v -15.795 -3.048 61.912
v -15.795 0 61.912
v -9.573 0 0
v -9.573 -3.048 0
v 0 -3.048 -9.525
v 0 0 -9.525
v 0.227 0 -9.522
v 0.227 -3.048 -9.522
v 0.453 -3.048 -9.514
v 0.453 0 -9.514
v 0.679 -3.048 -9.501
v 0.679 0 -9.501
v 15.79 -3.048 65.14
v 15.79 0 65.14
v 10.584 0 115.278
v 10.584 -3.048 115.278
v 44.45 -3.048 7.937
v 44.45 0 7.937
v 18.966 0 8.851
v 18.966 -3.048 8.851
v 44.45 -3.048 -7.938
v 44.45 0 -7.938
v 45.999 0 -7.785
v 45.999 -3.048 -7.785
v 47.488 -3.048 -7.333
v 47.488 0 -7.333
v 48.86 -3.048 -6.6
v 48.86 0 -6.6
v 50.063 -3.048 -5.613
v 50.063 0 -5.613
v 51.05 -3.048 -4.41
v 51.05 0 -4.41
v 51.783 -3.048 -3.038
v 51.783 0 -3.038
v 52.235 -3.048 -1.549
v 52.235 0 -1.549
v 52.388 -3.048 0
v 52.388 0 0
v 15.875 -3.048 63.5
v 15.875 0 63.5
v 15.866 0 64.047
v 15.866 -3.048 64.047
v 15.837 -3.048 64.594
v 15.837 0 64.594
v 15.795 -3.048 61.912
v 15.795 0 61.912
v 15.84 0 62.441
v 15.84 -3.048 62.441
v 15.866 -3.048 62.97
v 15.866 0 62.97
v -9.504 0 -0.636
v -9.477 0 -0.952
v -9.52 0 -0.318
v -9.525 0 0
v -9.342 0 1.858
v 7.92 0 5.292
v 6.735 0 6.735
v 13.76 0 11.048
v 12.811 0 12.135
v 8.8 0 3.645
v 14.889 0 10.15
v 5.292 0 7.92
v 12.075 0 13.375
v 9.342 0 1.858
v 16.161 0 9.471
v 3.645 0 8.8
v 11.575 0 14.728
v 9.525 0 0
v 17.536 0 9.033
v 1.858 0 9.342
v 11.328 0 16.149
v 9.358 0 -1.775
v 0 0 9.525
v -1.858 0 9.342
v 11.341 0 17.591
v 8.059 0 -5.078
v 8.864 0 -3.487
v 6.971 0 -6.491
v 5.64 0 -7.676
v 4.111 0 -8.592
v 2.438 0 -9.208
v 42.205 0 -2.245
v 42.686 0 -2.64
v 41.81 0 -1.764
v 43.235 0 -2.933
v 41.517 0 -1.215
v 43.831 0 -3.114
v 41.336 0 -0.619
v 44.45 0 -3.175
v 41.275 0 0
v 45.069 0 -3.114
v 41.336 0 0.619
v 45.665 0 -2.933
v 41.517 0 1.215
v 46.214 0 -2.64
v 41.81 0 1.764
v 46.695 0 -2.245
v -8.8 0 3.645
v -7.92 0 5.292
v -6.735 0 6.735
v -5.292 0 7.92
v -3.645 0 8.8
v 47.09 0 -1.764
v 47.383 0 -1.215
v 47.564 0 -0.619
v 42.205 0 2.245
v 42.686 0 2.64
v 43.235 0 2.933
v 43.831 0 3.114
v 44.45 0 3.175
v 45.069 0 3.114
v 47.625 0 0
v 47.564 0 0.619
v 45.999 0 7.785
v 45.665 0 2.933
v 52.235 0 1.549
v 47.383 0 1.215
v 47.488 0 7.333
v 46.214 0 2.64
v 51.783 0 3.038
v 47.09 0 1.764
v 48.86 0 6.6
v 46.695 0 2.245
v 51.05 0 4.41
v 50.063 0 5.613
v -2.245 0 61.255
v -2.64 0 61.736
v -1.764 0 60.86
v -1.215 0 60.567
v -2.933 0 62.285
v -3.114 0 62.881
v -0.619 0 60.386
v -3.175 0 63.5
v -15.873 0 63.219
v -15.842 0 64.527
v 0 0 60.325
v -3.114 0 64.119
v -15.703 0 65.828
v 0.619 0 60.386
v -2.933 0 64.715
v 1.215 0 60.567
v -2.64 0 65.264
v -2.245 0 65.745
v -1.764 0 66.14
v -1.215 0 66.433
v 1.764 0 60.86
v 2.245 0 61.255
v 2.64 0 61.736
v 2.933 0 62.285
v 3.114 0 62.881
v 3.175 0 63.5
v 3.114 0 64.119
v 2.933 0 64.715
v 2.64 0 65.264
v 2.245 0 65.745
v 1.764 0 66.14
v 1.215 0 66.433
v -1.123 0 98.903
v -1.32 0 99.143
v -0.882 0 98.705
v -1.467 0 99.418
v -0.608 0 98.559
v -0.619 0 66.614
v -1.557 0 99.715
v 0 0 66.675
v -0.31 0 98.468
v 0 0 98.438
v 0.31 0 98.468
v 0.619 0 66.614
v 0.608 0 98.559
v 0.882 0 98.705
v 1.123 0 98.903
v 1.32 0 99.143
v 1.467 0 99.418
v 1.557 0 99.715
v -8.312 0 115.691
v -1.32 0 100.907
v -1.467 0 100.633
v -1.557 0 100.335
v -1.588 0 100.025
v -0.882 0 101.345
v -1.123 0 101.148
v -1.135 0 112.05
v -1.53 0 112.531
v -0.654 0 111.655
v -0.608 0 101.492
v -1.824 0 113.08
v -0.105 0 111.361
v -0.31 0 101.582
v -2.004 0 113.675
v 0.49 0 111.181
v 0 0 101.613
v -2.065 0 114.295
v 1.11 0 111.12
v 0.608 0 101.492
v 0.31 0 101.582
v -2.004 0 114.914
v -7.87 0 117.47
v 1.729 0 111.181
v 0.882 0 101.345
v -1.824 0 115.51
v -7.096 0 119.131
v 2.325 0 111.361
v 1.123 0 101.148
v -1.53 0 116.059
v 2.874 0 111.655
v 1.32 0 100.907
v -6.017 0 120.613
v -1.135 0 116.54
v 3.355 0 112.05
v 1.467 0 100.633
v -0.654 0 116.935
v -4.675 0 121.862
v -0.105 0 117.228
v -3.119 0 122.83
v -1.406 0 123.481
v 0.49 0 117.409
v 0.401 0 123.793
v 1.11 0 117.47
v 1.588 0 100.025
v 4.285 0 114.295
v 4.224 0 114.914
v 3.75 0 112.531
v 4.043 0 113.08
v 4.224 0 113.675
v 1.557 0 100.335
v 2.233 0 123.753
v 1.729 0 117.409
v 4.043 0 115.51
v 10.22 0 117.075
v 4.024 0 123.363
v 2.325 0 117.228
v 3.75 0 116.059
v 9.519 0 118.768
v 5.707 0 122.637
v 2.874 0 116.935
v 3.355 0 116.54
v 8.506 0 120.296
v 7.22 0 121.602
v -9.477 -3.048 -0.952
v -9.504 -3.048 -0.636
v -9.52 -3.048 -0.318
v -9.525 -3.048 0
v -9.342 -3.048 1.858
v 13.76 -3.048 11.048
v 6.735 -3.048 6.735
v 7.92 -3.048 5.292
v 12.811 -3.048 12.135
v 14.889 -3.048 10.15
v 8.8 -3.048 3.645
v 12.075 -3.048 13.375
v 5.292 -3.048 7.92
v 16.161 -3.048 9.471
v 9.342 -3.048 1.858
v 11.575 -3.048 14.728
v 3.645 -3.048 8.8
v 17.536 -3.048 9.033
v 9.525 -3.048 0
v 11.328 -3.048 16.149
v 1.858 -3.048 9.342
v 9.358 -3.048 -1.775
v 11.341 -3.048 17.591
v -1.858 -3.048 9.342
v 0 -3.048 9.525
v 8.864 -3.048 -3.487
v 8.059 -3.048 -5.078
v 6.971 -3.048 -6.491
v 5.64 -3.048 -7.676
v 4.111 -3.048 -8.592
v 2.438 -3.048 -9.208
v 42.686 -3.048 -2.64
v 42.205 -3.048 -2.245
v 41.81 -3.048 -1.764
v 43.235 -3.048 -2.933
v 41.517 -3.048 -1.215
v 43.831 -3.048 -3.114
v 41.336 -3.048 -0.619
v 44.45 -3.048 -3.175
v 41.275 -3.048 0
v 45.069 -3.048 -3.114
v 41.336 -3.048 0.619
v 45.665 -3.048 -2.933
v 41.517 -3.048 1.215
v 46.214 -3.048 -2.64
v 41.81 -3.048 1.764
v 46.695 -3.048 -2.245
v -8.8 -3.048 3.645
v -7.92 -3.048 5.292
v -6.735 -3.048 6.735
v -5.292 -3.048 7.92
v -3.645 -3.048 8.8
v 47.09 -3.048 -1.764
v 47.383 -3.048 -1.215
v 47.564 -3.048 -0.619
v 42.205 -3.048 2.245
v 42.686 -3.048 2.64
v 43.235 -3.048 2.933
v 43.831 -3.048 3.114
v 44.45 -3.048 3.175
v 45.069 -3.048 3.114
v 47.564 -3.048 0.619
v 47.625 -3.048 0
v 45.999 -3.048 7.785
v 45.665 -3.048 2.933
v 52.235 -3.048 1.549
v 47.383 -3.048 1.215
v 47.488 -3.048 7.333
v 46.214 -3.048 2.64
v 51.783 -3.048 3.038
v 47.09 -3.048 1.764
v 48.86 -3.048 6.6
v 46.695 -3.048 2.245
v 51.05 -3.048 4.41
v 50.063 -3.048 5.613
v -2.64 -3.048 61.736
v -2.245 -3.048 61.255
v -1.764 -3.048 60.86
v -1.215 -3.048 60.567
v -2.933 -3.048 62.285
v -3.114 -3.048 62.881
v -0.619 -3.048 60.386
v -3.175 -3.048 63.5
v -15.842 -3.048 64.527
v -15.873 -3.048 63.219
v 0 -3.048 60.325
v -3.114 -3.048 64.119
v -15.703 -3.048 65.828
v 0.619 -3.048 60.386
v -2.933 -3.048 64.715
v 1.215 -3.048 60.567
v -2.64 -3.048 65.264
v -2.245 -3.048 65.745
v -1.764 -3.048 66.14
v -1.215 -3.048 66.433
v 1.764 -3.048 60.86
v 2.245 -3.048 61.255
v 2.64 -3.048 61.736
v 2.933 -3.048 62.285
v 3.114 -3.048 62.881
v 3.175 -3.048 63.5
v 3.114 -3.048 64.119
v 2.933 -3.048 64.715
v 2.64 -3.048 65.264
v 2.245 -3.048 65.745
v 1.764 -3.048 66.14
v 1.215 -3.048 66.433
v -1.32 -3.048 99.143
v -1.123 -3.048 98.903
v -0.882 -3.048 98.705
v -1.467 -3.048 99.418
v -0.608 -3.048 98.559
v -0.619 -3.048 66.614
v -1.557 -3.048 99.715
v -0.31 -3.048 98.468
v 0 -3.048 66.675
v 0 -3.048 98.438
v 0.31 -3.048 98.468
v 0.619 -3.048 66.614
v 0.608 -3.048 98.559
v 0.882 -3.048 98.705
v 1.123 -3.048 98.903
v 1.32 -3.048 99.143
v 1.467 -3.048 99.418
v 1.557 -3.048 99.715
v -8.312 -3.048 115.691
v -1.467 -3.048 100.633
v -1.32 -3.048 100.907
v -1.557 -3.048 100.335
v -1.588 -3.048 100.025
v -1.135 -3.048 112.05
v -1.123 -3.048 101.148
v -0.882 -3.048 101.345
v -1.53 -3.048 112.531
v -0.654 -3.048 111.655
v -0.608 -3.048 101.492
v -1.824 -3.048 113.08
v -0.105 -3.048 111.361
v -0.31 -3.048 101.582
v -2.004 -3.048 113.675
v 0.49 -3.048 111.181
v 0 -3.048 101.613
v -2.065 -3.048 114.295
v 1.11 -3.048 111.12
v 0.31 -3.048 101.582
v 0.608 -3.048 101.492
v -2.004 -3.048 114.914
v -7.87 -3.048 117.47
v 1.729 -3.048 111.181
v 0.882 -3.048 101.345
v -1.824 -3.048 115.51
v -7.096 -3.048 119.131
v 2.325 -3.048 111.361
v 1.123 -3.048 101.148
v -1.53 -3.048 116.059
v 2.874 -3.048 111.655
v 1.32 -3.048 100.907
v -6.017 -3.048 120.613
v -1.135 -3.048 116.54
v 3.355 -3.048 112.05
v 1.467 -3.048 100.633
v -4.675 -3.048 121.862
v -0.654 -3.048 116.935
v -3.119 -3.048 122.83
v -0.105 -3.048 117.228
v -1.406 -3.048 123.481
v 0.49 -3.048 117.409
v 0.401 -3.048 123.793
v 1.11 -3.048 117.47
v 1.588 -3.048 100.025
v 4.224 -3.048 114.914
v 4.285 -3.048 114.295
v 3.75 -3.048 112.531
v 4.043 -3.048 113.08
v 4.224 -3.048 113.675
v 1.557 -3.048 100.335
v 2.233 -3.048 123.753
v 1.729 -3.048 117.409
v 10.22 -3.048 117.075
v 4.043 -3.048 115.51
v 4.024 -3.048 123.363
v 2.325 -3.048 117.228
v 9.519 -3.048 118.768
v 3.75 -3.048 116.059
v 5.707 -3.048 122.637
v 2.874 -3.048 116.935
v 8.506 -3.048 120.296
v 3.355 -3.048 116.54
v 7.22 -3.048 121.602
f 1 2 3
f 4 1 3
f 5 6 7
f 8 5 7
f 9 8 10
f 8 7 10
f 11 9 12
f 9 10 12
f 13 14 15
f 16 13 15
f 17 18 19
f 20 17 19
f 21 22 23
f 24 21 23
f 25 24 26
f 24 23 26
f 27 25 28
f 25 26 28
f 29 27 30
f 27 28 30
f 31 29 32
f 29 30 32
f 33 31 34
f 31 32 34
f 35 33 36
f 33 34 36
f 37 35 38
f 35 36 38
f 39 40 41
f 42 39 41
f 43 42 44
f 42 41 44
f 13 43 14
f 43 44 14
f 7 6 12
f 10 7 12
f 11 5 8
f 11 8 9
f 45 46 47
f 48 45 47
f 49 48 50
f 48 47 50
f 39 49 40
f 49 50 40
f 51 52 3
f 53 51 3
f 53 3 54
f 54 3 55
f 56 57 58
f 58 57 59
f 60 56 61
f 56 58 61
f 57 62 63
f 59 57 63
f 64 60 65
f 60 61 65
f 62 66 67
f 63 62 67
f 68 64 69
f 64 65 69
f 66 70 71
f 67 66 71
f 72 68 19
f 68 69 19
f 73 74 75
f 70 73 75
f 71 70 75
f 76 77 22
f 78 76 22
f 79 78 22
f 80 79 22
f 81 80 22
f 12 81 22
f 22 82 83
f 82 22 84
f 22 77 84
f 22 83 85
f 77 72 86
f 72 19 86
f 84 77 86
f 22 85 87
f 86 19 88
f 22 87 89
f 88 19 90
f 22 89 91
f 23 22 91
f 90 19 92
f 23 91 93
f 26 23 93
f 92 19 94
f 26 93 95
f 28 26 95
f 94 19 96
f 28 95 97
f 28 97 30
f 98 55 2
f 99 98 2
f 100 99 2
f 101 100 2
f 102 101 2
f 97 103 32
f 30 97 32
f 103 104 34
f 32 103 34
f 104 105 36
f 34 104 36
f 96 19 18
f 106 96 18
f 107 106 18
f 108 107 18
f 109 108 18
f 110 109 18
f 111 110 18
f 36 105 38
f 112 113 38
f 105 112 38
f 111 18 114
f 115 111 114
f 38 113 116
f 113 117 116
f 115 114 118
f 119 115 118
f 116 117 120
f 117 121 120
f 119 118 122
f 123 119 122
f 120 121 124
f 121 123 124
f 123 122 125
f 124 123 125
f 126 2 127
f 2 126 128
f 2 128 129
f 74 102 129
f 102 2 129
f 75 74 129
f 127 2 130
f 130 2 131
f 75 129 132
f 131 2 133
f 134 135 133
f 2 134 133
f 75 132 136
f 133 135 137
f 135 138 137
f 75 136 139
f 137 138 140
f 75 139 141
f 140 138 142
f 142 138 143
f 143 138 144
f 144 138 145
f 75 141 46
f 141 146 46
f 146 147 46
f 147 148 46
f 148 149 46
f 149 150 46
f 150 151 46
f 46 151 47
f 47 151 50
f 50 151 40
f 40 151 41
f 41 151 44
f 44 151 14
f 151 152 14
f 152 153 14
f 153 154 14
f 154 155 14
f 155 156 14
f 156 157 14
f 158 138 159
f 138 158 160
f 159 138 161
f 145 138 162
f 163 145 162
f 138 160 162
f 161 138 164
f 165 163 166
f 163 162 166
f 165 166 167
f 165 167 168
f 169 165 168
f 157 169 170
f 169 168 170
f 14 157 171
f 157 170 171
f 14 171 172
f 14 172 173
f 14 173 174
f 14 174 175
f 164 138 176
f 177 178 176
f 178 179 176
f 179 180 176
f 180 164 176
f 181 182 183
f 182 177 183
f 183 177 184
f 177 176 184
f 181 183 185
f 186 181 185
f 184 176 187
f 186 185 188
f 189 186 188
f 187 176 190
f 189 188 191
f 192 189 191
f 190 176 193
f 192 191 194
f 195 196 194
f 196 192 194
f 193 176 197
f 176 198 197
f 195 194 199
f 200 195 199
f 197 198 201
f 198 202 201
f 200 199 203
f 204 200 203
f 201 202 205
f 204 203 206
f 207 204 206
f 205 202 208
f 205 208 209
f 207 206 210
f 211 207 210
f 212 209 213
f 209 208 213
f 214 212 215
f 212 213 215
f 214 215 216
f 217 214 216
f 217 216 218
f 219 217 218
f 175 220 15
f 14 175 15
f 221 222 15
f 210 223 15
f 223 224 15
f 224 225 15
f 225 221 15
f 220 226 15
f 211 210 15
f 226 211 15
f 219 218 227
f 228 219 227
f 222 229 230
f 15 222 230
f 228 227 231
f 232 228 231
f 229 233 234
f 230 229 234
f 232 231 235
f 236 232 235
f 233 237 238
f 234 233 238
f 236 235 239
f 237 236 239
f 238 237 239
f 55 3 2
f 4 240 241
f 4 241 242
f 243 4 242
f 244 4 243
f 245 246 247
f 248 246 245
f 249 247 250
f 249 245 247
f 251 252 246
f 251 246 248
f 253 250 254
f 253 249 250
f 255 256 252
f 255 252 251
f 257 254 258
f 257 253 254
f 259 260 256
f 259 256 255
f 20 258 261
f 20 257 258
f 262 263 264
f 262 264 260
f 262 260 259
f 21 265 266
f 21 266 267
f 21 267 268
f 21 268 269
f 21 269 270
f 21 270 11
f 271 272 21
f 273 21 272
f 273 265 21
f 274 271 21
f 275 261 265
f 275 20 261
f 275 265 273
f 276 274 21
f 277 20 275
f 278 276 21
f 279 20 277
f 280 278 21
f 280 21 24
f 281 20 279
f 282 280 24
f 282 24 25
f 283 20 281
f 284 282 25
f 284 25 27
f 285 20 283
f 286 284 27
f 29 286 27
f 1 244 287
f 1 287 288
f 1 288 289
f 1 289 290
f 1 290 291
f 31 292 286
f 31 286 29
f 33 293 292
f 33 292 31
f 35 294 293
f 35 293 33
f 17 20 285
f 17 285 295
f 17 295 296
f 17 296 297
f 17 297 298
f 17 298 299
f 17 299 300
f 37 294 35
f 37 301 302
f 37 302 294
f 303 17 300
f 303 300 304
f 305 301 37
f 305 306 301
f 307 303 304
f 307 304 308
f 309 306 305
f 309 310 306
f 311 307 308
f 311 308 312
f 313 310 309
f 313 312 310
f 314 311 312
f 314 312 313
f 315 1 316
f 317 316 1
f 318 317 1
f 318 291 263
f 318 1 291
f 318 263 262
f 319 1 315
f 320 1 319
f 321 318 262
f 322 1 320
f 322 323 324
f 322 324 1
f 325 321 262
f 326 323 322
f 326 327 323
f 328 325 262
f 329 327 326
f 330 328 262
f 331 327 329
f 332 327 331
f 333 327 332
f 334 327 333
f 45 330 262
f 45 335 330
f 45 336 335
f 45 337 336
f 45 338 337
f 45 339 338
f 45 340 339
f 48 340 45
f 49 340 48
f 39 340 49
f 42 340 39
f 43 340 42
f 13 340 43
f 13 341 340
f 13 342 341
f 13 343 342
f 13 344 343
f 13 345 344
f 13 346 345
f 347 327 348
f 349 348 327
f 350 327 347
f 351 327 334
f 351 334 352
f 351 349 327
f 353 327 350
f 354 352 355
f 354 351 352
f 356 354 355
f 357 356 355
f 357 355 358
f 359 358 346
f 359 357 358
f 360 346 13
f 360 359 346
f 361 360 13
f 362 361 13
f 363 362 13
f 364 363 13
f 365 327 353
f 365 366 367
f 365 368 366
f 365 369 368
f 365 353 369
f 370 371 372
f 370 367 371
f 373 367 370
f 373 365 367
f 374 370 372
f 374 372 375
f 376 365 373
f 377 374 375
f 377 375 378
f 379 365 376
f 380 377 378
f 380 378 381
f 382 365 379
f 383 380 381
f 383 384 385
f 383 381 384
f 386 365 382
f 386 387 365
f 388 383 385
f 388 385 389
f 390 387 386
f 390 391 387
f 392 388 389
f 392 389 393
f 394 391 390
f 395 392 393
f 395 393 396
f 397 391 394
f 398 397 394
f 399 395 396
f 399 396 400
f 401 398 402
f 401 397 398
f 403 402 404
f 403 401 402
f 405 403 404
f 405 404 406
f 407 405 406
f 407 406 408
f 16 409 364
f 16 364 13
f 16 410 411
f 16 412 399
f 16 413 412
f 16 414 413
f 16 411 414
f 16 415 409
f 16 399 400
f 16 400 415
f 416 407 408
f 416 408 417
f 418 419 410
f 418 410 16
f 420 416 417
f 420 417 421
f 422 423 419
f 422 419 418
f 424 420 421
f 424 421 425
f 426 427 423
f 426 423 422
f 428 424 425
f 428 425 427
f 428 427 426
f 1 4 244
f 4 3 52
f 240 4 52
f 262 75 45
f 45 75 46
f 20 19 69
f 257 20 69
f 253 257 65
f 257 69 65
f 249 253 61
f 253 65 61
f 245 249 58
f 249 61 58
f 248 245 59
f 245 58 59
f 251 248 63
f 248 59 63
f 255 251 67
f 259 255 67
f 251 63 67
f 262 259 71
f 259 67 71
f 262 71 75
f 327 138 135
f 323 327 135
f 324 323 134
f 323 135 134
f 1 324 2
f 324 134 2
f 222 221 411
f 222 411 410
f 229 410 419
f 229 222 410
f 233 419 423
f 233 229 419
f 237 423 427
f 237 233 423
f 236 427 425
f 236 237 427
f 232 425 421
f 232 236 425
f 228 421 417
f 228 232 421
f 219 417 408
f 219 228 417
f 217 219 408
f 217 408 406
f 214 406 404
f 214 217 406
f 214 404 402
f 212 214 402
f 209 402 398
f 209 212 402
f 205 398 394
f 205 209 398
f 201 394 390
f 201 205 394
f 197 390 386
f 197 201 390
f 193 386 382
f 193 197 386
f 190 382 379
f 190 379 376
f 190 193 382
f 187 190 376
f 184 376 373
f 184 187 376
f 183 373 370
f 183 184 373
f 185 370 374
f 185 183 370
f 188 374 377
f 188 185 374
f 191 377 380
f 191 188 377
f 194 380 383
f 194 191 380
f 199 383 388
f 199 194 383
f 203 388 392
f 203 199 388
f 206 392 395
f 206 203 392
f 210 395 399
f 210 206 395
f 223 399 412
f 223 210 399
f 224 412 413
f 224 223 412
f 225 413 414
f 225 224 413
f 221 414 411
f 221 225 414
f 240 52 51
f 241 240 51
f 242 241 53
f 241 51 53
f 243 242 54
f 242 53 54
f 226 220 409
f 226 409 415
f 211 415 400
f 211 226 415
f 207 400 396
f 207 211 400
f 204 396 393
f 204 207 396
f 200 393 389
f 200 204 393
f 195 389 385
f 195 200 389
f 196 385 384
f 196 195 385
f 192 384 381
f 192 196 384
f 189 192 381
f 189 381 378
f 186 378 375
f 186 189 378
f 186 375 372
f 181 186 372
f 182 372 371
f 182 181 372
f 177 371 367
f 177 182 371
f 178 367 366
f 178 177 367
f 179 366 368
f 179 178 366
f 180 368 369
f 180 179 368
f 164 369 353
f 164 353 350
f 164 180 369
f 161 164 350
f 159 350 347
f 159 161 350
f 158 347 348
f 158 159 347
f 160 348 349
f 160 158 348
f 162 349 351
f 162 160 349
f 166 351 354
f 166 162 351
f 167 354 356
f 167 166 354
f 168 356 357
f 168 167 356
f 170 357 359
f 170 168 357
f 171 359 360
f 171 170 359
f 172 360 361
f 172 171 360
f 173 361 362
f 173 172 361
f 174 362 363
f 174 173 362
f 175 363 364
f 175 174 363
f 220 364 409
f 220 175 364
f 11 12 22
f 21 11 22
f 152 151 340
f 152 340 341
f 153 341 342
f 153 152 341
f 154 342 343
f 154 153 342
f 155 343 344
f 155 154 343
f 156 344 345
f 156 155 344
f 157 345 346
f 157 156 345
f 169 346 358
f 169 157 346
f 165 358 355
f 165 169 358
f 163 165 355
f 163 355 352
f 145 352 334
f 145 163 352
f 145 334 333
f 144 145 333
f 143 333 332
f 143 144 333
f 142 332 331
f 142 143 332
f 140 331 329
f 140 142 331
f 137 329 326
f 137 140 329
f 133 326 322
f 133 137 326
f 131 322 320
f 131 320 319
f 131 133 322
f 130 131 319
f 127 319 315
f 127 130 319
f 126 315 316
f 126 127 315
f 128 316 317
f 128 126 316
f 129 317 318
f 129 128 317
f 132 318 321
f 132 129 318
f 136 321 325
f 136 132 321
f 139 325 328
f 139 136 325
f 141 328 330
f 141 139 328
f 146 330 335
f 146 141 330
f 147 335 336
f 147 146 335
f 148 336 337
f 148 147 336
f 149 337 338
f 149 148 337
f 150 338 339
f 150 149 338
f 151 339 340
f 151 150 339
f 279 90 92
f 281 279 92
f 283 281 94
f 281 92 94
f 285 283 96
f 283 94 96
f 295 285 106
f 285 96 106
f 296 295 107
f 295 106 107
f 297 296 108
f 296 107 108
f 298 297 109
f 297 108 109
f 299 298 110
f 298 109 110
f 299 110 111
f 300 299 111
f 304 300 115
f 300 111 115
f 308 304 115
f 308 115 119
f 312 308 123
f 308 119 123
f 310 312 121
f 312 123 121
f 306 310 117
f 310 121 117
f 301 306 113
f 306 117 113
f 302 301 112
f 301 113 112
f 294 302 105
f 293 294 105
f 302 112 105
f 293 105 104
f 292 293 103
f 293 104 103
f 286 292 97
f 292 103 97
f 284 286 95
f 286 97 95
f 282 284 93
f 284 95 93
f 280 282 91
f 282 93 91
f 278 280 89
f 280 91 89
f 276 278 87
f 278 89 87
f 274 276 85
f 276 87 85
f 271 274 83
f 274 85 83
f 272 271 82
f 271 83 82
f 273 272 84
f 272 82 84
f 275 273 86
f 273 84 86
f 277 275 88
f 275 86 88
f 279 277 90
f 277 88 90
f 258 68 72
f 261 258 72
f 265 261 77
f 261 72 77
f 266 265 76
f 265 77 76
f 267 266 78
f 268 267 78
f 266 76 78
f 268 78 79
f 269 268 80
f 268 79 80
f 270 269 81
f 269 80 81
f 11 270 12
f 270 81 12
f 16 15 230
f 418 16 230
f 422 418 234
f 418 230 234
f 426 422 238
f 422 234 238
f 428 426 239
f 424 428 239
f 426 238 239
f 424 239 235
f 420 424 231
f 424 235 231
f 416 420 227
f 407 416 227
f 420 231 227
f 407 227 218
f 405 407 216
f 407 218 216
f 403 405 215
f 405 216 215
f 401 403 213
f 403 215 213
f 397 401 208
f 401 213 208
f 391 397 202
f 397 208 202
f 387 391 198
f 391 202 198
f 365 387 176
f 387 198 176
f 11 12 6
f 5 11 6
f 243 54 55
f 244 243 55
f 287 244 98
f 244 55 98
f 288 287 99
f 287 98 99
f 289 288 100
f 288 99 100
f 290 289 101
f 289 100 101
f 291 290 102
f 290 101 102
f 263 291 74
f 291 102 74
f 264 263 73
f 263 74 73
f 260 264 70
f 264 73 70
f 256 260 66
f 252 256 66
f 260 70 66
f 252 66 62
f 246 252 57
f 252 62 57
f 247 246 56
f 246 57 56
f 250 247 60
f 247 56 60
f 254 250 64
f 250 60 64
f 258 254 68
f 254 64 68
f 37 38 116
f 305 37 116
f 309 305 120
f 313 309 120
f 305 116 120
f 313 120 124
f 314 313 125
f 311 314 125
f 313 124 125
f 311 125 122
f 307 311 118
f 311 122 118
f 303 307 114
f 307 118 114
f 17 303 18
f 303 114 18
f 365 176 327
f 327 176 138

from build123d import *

# Parameters (mm, degrees)
F1_DEPTH = 3.048
F0_R     = 3.175
F0_R_2   = 1.5875


with BuildPart() as f1:
    # F0 (on Front) → F1 (new body)
    with BuildSketch(Plane.XZ):
        with BuildLine():
            Line((0.6794904459, -9.5007324841), (0, -9.525))
            ThreePointArc((0, -9.525), (0.3399618281, -9.5189311877), (0.6794904459, -9.5007324841))
        make_face()
    extrude(amount=F1_DEPTH)


with BuildPart() as f1b:
    # F0 (on Front) → F1, piece 2 (new body)
    with BuildSketch(Plane.XZ):
        with BuildLine():
            ThreePointArc((-9.4772553384, -0.9525), (-9.5130563464, -0.4768479324), (-9.525, 0))
            Line((-9.525, 0), (-9.5729851903, 0))
            Line((-9.5729851903, 0), (-9.4772553384, -0.9525))
        make_face()
        with BuildLine():
            ThreePointArc((10.5838407899, 115.2783708019), (1.3178351498, 123.8173396834), (-8.3122753992, 115.691220013))
            ThreePointArc((-8.3122753992, 115.691220013), (0.4095807766, 104.7953834825), (10.6347791414, 114.2946122538))
            ThreePointArc((10.6347791414, 114.2946122538), (10.6220360293, 114.7871504748), (10.5838407899, 115.2783708019))
        make_face()
        with Locations((1.1097791414, 114.2946122538)):
            Circle(F0_R, mode=Mode.SUBTRACT)
        with BuildLine():
            Line((36.5125, 0), (9.525, 0))
            ThreePointArc((9.525, 0), (6.9712901065, -6.4905114784), (0.6794904459, -9.5007324841))
            Line((0.6794904459, -9.5007324841), (44.45, -7.9375))
            ThreePointArc((44.45, -7.9375), (38.8373399243, -5.6126600757), (36.5125, 0))
        make_face()
        with BuildLine():
            ThreePointArc((44.45, 7.9375), (38.8373399243, 5.6126600757), (36.5125, 0))
            ThreePointArc((36.5125, 0), (38.8373399243, -5.6126600757), (44.45, -7.9375))
            ThreePointArc((44.45, -7.9375), (50.0626600757, -5.6126600757), (52.3875, 0))
            ThreePointArc((52.3875, 0), (50.0626600757, 5.6126600757), (44.45, 7.9375))
        make_face()
        with BuildLine():
            ThreePointArc((47.625, 0), (44.45, -3.175), (41.275, 0))
            ThreePointArc((41.275, 0), (44.45, 3.175), (47.625, 0))
        make_face(mode=Mode.SUBTRACT)
        with BuildLine():
            Line((-8.3122753992, 115.691220013), (-15.7034242344, 65.8276795986))
            ThreePointArc((-15.7034242344, 65.8276795986), (0.3467600139, 79.3712123826), (15.7901027475, 65.13959758))
            Line((15.7901027475, 65.13959758), (10.5838407899, 115.2783708019))
            ThreePointArc((10.5838407899, 115.2783708019), (10.6220360293, 114.7871504748), (10.6347791414, 114.2946122538))
            ThreePointArc((10.6347791414, 114.2946122538), (0.4095807766, 104.7953834825), (-8.3122753992, 115.691220013))
        make_face()
        with Locations((0, 100.0252)):
            Circle(F0_R_2, mode=Mode.SUBTRACT)
        with BuildLine():
            ThreePointArc((-15.7034242344, 65.8276795986), (-15.8706188436, 63.8729376901), (-15.7954255641, 61.9125))
            ThreePointArc((-15.7954255641, 61.9125), (0, 47.625), (15.7954255641, 61.9125))
            ThreePointArc((15.7954255641, 61.9125), (15.8550939106, 62.7052534459), (15.875, 63.5))
            ThreePointArc((15.875, 63.5), (15.8537614798, 64.3208970349), (15.7901027475, 65.13959758))
            ThreePointArc((15.7901027475, 65.13959758), (0.3467600139, 79.3712123826), (-15.7034242344, 65.8276795986))
        make_face()
        with Locations((0, 63.5)):
            Circle(F0_R, mode=Mode.SUBTRACT)
        with BuildLine():
            Line((-9.5729851903, 0), (-9.525, 0))
            ThreePointArc((-9.525, 0), (0, 9.525), (9.525, 0))
            Line((9.525, 0), (36.5125, 0))
            ThreePointArc((36.5125, 0), (38.8373399243, 5.6126600757), (44.45, 7.9375))
            Line((44.45, 7.9375), (18.9664742022, 8.8511343208))
            ThreePointArc((18.9664742022, 8.8511343208), (13.260685791, 11.5695707689), (11.3409723165, 17.5912497948))
            Line((11.3409723165, 17.5912497948), (15.7954255641, 61.9125))
            ThreePointArc((15.7954255641, 61.9125), (0, 47.625), (-15.7954255641, 61.9125))
            Line((-15.7954255641, 61.9125), (-9.5729851903, 0))
        make_face()
    extrude(amount=F1_DEPTH)


solid = Compound([f1.part, f1b.part])
